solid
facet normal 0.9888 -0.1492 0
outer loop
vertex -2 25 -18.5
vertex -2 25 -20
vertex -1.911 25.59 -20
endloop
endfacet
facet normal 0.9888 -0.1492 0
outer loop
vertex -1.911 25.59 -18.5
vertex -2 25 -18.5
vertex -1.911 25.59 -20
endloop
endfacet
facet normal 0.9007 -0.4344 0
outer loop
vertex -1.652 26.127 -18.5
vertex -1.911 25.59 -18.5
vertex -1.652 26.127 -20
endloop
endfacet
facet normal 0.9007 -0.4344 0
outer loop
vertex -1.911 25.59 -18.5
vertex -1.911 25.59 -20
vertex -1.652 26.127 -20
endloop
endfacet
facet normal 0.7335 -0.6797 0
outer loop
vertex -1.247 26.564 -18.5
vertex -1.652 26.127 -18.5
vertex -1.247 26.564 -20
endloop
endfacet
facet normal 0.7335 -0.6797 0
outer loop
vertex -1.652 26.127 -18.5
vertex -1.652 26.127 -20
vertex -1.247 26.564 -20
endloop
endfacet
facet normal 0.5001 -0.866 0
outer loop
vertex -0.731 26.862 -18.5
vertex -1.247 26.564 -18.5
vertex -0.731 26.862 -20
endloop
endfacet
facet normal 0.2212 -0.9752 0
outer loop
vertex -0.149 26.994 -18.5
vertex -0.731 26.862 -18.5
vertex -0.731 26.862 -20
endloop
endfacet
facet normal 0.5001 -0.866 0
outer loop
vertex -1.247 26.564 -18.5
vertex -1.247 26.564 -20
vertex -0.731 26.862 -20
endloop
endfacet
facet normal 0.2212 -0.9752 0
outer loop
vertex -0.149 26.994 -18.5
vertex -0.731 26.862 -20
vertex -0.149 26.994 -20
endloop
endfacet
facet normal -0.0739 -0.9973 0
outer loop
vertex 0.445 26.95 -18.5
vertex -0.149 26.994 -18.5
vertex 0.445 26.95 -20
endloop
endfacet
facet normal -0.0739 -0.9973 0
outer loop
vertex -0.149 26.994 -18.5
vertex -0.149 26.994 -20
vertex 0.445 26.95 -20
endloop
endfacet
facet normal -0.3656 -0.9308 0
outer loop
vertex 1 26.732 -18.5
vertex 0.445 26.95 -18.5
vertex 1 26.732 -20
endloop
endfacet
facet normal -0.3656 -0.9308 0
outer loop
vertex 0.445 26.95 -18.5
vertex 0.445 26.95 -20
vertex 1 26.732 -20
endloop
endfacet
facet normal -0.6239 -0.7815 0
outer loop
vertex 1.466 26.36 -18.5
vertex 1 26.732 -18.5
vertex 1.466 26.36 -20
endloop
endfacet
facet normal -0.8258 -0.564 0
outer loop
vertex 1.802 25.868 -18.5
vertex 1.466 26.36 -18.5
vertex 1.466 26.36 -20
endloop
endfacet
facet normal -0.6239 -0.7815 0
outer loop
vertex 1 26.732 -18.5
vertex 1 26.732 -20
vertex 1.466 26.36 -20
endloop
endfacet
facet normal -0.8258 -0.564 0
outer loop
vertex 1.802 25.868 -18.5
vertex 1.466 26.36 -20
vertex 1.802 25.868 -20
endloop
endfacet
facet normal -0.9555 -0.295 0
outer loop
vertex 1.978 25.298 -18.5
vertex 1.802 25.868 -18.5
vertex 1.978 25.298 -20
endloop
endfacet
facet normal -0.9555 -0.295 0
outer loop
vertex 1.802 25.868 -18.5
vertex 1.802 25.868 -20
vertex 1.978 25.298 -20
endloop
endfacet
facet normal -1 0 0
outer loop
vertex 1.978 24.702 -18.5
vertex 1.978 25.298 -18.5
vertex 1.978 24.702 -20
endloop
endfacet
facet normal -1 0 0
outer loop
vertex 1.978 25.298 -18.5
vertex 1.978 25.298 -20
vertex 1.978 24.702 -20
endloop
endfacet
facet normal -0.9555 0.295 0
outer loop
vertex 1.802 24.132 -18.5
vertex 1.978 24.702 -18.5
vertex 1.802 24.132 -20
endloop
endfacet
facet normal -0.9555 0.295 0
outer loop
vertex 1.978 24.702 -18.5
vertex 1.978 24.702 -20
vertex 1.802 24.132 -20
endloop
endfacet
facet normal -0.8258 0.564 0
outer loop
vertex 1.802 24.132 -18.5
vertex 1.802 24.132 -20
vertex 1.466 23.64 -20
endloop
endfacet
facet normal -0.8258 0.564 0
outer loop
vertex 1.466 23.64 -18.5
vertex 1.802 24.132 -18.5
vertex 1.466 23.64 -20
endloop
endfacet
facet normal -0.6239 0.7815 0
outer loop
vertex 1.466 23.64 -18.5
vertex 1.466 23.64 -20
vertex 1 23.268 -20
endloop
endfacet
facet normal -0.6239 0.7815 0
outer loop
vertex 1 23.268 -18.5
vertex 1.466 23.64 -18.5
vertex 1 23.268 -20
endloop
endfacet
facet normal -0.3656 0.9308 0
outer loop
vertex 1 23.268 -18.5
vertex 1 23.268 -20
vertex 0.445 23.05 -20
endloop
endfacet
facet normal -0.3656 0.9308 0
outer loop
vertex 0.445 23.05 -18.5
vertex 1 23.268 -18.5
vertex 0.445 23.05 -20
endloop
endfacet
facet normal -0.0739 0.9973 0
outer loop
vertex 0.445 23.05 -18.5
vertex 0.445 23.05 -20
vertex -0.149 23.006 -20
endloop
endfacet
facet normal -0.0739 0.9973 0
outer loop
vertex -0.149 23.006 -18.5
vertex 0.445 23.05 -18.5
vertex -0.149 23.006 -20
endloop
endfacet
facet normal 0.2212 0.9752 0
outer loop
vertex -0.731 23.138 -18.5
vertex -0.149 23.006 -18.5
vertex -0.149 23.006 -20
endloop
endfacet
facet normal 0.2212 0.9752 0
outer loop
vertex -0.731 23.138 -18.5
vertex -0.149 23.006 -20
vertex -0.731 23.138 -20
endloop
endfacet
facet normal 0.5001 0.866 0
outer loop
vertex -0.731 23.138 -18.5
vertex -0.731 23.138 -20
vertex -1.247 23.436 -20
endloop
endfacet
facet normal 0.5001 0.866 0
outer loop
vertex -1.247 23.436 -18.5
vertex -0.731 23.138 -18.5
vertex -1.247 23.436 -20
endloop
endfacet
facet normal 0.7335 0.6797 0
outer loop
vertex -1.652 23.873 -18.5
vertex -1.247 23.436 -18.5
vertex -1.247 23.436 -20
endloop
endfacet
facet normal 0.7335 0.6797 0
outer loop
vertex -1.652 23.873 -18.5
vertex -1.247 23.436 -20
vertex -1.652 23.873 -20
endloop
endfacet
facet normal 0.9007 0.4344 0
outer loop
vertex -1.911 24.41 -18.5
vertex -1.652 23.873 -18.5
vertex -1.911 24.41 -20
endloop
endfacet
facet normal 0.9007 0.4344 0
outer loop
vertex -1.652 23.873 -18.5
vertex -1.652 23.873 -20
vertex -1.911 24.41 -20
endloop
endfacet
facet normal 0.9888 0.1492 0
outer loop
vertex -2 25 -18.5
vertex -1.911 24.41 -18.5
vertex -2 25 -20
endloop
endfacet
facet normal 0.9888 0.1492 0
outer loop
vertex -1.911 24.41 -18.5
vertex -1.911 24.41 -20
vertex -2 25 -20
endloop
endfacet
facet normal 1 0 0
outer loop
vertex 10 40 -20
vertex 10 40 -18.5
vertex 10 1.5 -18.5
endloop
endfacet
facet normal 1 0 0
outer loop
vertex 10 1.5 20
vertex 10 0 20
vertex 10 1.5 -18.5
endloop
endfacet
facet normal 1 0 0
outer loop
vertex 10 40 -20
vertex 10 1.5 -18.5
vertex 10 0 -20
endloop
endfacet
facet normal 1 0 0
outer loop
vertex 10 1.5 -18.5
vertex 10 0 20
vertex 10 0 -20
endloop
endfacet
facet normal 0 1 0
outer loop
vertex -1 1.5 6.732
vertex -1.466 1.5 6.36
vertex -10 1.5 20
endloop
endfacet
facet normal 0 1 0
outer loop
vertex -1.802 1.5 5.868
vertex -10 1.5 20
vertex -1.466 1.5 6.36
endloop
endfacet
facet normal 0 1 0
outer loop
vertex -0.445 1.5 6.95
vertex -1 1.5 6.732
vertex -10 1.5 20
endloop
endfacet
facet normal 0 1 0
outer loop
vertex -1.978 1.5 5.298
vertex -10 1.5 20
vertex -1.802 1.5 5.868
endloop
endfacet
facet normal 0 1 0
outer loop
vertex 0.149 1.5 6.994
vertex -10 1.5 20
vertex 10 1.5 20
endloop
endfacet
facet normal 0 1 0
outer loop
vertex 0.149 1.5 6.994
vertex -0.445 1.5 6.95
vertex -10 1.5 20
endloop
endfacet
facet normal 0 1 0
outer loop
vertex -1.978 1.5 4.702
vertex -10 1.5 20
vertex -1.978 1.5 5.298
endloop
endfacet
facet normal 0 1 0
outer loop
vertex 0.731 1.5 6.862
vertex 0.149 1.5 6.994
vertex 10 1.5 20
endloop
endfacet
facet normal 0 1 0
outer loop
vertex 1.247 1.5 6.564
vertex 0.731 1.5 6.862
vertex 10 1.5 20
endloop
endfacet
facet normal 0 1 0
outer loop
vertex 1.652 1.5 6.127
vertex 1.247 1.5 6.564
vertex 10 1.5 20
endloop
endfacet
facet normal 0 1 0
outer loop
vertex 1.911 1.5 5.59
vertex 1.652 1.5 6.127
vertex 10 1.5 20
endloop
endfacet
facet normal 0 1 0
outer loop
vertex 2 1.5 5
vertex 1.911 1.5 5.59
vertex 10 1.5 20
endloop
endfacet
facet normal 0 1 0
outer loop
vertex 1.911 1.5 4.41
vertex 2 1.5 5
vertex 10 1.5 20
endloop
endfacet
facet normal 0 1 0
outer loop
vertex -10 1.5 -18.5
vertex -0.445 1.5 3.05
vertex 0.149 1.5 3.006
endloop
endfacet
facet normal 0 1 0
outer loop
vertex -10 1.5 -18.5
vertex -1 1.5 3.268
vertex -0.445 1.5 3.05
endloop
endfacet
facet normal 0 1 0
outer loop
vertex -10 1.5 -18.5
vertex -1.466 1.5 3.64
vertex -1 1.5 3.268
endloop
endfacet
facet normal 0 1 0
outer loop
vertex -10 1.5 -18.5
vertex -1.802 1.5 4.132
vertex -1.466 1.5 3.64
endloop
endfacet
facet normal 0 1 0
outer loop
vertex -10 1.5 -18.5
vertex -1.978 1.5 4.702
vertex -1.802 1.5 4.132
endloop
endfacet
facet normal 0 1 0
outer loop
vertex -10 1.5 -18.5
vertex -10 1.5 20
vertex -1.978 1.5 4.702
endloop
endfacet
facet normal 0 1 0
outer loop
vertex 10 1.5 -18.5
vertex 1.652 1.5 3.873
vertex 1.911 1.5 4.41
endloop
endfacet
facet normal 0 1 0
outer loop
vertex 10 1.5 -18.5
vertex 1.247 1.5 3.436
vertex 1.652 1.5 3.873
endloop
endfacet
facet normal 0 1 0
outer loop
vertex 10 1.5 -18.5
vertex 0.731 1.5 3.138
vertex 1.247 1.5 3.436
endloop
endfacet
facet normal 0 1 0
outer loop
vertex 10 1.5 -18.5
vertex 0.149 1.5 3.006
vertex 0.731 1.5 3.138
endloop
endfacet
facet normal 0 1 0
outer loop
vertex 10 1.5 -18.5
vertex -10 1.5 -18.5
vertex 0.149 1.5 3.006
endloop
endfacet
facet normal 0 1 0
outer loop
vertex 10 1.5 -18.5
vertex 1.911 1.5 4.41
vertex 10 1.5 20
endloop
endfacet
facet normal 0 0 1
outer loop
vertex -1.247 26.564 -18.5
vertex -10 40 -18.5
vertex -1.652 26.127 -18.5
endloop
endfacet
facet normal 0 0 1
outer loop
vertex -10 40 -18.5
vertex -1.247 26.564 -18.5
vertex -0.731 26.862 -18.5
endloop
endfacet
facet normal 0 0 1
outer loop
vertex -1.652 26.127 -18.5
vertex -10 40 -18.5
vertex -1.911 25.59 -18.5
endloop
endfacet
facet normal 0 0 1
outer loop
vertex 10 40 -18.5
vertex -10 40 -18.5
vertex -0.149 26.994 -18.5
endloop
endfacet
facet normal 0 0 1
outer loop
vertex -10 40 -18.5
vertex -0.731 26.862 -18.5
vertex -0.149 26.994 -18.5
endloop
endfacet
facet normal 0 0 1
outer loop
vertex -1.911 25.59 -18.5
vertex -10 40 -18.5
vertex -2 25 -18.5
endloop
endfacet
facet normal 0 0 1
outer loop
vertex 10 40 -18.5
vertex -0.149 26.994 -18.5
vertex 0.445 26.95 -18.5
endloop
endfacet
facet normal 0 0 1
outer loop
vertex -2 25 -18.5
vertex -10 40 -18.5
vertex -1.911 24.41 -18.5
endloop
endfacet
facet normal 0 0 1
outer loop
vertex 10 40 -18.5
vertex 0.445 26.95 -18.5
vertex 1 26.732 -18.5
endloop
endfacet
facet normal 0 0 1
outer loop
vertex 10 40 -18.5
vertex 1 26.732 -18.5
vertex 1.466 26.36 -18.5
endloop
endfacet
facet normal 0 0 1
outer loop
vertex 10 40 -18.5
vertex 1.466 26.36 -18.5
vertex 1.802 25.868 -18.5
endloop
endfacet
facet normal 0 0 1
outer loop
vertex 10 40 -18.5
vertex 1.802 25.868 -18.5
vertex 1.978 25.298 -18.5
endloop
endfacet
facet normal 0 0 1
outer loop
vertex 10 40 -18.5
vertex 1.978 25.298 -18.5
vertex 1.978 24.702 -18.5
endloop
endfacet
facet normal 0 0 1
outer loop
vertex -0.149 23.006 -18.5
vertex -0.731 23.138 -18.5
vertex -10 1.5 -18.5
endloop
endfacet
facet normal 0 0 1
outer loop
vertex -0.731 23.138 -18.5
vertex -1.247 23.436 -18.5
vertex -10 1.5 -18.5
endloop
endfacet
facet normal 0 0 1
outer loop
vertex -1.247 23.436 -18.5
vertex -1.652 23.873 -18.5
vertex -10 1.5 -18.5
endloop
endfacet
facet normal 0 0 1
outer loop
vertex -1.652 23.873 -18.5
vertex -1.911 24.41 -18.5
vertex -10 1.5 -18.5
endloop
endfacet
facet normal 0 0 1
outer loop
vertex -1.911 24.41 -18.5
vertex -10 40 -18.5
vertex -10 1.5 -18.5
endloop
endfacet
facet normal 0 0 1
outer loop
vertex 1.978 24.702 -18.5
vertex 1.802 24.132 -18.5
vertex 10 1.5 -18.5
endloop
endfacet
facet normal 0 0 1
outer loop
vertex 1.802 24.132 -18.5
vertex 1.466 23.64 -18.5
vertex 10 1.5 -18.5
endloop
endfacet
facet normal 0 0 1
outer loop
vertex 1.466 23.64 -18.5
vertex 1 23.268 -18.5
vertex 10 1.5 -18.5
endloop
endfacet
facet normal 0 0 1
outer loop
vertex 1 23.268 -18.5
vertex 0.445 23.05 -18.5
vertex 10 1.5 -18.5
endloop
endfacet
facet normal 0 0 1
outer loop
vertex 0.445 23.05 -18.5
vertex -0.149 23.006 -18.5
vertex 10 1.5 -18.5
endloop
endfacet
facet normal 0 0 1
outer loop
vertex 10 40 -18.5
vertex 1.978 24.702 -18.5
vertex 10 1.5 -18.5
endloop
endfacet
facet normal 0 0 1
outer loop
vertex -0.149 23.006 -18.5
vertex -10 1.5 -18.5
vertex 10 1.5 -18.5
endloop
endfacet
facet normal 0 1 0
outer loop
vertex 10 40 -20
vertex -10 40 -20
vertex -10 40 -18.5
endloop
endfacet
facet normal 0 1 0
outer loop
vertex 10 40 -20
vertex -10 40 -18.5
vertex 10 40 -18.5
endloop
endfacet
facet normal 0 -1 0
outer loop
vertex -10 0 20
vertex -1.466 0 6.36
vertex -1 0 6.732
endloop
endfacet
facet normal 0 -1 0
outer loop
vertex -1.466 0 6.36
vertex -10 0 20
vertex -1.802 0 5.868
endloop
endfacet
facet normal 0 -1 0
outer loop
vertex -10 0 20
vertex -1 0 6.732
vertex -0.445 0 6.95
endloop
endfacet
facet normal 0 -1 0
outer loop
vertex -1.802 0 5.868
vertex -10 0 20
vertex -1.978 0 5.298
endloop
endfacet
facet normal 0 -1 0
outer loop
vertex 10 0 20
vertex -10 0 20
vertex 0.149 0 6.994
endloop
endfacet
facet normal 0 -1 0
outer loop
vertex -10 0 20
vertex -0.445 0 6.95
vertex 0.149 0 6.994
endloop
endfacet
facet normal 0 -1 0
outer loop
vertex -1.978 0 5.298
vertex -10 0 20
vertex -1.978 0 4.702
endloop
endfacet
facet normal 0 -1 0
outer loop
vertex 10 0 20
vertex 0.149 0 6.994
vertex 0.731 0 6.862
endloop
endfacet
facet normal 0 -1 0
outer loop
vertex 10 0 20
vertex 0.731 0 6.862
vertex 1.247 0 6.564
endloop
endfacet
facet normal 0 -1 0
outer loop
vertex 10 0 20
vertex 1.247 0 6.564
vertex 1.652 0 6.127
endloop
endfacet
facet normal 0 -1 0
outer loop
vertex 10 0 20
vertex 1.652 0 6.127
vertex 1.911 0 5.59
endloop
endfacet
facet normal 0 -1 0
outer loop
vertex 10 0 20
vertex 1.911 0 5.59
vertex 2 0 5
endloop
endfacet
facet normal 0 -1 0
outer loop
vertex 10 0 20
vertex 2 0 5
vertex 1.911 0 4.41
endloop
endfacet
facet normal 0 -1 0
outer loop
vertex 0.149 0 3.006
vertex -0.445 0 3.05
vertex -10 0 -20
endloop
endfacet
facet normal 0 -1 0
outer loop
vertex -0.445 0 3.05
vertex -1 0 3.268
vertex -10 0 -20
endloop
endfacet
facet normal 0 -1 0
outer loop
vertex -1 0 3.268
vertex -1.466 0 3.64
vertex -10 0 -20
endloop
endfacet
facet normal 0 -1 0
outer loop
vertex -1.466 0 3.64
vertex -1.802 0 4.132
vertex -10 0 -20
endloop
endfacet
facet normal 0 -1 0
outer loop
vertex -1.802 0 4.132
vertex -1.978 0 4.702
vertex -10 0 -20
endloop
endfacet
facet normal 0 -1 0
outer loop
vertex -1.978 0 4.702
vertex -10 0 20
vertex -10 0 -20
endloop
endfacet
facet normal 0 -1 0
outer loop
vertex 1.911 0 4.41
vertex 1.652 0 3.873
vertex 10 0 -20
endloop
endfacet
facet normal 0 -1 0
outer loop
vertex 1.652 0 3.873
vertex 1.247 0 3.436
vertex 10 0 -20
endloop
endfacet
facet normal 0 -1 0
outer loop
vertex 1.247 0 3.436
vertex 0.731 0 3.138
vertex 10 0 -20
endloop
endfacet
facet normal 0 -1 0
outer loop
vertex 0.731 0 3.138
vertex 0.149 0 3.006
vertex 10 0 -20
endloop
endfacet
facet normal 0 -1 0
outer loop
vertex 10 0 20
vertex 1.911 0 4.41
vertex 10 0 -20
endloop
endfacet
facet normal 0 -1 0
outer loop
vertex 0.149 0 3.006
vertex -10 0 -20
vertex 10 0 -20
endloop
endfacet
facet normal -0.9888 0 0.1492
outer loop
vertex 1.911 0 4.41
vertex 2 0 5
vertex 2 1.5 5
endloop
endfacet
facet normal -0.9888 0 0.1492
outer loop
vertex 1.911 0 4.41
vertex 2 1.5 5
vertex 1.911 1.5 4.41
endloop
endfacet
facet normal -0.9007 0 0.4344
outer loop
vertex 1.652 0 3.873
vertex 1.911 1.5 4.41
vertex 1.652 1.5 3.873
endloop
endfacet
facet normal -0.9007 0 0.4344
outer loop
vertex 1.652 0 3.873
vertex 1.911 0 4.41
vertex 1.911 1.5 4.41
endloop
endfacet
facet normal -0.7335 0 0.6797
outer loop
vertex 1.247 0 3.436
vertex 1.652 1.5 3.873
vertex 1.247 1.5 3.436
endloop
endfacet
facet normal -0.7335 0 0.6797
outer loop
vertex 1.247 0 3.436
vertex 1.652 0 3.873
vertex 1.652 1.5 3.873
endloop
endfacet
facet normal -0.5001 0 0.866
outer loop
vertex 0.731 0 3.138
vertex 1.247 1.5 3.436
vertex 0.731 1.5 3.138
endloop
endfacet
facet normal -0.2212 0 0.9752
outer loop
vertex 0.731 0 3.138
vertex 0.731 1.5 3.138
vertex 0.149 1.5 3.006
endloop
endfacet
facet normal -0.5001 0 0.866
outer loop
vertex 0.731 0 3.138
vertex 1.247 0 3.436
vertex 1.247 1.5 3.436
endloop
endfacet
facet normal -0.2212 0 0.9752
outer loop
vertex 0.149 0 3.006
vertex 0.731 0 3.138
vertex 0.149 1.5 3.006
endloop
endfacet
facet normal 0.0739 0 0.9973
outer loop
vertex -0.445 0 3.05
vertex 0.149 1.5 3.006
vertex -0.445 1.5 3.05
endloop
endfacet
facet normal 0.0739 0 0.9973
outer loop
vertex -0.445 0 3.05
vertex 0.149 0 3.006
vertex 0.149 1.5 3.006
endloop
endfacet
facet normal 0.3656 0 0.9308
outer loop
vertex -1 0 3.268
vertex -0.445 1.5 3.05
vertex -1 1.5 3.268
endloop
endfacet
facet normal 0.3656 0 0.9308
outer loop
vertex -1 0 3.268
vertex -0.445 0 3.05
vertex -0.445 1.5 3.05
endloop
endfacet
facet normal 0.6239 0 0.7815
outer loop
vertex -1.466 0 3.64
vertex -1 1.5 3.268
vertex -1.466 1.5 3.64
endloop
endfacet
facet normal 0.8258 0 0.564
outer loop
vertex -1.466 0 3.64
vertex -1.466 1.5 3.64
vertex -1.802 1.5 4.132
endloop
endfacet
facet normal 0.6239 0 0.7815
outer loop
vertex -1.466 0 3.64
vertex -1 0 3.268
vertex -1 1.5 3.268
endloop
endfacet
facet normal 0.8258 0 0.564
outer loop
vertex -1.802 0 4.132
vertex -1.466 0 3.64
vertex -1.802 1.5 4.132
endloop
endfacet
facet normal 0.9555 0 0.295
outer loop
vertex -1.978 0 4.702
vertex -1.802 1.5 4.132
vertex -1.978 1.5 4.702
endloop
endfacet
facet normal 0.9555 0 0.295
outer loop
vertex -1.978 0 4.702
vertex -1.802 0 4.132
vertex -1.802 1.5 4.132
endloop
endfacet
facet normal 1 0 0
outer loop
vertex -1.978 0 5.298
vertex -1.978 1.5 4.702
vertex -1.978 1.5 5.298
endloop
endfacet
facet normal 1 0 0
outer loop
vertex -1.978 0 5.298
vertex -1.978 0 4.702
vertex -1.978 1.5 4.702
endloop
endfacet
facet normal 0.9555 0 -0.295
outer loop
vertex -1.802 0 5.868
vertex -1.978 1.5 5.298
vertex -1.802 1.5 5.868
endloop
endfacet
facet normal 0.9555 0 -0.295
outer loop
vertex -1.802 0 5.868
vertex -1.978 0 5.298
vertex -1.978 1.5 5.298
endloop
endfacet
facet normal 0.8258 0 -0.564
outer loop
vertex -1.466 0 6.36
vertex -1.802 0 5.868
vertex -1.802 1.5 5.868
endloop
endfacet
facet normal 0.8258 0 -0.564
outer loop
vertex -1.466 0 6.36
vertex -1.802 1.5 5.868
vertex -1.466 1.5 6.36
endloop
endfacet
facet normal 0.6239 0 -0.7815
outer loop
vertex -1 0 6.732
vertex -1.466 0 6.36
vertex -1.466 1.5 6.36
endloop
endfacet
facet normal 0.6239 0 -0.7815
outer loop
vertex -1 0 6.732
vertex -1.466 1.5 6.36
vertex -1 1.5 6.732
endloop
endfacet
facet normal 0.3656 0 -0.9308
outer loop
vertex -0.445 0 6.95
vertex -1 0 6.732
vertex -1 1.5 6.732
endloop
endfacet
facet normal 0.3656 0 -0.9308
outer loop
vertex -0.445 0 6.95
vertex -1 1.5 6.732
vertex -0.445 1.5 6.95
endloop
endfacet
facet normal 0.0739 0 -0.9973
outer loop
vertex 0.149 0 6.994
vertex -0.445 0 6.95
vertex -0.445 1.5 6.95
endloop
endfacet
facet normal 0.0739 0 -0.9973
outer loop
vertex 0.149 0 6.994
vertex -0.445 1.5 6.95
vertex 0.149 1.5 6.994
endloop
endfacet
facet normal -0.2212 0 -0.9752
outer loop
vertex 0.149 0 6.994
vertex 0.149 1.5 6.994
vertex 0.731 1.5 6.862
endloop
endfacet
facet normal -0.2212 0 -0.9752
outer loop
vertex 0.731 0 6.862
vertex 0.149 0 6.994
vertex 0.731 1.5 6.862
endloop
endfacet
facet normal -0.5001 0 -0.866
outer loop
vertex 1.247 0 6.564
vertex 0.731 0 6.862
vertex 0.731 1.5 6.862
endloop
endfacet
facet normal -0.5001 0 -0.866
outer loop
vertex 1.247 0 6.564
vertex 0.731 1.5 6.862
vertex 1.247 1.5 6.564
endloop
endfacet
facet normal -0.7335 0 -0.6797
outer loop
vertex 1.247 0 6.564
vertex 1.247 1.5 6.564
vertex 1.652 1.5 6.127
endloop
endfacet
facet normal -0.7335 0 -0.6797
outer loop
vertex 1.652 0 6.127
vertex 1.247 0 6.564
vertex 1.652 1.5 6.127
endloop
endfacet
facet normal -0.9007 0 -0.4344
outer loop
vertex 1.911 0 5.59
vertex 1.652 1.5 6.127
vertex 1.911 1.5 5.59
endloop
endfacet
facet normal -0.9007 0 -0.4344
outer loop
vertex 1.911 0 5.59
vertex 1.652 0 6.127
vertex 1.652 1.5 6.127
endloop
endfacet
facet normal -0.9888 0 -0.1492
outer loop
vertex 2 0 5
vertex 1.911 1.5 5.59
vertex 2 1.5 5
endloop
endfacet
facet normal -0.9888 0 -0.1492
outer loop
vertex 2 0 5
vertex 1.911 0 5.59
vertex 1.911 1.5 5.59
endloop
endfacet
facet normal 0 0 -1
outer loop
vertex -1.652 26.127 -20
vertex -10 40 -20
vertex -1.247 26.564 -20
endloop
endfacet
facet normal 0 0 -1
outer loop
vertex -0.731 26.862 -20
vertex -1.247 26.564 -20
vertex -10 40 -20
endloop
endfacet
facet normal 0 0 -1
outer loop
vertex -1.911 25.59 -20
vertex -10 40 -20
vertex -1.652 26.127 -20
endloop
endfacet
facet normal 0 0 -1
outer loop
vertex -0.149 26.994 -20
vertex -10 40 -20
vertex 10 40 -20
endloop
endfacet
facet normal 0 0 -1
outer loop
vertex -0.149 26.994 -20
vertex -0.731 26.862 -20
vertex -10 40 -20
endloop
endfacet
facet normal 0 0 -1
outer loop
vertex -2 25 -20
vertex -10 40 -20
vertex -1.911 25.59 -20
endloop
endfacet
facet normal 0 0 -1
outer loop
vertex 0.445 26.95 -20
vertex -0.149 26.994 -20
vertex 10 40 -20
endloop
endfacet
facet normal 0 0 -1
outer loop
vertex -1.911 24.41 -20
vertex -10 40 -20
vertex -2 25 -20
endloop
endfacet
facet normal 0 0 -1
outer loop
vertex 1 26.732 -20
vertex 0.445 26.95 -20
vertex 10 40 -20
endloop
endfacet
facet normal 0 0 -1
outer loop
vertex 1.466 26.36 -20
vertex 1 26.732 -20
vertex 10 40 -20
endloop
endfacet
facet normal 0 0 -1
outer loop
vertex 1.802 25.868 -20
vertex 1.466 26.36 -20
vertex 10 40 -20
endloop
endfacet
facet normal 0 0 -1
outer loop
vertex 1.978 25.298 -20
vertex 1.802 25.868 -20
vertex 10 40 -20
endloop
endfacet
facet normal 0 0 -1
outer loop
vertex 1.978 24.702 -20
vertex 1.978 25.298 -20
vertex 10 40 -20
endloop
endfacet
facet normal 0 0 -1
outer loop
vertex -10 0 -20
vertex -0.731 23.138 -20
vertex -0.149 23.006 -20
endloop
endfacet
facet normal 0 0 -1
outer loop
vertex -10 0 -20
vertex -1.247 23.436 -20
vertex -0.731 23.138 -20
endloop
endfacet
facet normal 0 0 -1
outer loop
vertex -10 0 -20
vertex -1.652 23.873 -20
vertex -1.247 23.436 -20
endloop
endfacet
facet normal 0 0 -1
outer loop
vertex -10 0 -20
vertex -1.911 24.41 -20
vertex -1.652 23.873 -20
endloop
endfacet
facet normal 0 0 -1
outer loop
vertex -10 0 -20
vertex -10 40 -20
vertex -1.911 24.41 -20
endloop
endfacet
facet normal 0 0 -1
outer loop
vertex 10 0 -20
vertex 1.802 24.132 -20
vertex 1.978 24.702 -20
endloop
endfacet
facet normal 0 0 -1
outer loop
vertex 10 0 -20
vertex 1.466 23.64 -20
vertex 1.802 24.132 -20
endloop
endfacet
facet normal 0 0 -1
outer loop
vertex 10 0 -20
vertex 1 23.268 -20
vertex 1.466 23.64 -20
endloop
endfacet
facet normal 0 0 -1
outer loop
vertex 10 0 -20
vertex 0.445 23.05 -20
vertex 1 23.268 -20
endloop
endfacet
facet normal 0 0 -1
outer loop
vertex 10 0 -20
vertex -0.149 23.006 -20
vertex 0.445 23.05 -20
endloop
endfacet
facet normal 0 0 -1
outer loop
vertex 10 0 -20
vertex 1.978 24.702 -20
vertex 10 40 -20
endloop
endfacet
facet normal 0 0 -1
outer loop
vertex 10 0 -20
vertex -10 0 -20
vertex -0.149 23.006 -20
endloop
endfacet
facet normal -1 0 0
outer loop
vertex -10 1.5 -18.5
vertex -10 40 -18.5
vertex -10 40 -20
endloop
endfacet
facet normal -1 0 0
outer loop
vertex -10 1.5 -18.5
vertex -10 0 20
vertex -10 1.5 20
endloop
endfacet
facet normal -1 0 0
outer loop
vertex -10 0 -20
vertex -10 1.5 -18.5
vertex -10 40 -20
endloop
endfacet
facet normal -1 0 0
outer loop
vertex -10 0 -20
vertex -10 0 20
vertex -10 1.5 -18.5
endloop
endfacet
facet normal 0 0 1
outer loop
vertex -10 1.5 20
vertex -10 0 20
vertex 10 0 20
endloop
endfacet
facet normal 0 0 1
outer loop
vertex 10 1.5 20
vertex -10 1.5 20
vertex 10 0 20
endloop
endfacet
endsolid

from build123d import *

# Parameters (mm, degrees)
SKETCH1_W           = 20
SKETCH1_H           = 40
SKETCH1_R           = 2
BOSS_EXTRUDE1_DEPTH = 1.5
SKETCH2_W           = 20
SKETCH2_H           = 1.5
BOSS_EXTRUDE2_DEPTH = 38.5
SKETCH3_R           = 2
CUT_EXTRUDE1_DEPTH  = 1.5


with BuildPart() as part:
    # Sketch1 → Boss-Extrude1 (new body)
    with BuildSketch(Plane(origin=(0, 0, 0), x_dir=(1, 0, 0), z_dir=(0, 1, 0))):
        Rectangle(SKETCH1_W, SKETCH1_H)
        with Locations((0, -5)):
            Circle(SKETCH1_R, mode=Mode.SUBTRACT)
    extrude(amount=BOSS_EXTRUDE1_DEPTH)

    # Sketch2 → Boss-Extrude2 (add)
    with BuildSketch(Plane(origin=(0, 1.5, 0), x_dir=(1, 0, 0), z_dir=(0, 1, 0))):
        with Locations((0, 19.25)):
            Rectangle(SKETCH2_W, SKETCH2_H)
    extrude(amount=BOSS_EXTRUDE2_DEPTH)

    # Sketch3 → Cut-Extrude1 (cut)
    with BuildSketch(Plane(origin=(0, 0, -20), x_dir=(-1, 0, 0), z_dir=(0, 0, -1))):
        with Locations((0, 25)):
            Circle(SKETCH3_R)
    extrude(amount=-CUT_EXTRUDE1_DEPTH, mode=Mode.SUBTRACT)


solid = part.part
